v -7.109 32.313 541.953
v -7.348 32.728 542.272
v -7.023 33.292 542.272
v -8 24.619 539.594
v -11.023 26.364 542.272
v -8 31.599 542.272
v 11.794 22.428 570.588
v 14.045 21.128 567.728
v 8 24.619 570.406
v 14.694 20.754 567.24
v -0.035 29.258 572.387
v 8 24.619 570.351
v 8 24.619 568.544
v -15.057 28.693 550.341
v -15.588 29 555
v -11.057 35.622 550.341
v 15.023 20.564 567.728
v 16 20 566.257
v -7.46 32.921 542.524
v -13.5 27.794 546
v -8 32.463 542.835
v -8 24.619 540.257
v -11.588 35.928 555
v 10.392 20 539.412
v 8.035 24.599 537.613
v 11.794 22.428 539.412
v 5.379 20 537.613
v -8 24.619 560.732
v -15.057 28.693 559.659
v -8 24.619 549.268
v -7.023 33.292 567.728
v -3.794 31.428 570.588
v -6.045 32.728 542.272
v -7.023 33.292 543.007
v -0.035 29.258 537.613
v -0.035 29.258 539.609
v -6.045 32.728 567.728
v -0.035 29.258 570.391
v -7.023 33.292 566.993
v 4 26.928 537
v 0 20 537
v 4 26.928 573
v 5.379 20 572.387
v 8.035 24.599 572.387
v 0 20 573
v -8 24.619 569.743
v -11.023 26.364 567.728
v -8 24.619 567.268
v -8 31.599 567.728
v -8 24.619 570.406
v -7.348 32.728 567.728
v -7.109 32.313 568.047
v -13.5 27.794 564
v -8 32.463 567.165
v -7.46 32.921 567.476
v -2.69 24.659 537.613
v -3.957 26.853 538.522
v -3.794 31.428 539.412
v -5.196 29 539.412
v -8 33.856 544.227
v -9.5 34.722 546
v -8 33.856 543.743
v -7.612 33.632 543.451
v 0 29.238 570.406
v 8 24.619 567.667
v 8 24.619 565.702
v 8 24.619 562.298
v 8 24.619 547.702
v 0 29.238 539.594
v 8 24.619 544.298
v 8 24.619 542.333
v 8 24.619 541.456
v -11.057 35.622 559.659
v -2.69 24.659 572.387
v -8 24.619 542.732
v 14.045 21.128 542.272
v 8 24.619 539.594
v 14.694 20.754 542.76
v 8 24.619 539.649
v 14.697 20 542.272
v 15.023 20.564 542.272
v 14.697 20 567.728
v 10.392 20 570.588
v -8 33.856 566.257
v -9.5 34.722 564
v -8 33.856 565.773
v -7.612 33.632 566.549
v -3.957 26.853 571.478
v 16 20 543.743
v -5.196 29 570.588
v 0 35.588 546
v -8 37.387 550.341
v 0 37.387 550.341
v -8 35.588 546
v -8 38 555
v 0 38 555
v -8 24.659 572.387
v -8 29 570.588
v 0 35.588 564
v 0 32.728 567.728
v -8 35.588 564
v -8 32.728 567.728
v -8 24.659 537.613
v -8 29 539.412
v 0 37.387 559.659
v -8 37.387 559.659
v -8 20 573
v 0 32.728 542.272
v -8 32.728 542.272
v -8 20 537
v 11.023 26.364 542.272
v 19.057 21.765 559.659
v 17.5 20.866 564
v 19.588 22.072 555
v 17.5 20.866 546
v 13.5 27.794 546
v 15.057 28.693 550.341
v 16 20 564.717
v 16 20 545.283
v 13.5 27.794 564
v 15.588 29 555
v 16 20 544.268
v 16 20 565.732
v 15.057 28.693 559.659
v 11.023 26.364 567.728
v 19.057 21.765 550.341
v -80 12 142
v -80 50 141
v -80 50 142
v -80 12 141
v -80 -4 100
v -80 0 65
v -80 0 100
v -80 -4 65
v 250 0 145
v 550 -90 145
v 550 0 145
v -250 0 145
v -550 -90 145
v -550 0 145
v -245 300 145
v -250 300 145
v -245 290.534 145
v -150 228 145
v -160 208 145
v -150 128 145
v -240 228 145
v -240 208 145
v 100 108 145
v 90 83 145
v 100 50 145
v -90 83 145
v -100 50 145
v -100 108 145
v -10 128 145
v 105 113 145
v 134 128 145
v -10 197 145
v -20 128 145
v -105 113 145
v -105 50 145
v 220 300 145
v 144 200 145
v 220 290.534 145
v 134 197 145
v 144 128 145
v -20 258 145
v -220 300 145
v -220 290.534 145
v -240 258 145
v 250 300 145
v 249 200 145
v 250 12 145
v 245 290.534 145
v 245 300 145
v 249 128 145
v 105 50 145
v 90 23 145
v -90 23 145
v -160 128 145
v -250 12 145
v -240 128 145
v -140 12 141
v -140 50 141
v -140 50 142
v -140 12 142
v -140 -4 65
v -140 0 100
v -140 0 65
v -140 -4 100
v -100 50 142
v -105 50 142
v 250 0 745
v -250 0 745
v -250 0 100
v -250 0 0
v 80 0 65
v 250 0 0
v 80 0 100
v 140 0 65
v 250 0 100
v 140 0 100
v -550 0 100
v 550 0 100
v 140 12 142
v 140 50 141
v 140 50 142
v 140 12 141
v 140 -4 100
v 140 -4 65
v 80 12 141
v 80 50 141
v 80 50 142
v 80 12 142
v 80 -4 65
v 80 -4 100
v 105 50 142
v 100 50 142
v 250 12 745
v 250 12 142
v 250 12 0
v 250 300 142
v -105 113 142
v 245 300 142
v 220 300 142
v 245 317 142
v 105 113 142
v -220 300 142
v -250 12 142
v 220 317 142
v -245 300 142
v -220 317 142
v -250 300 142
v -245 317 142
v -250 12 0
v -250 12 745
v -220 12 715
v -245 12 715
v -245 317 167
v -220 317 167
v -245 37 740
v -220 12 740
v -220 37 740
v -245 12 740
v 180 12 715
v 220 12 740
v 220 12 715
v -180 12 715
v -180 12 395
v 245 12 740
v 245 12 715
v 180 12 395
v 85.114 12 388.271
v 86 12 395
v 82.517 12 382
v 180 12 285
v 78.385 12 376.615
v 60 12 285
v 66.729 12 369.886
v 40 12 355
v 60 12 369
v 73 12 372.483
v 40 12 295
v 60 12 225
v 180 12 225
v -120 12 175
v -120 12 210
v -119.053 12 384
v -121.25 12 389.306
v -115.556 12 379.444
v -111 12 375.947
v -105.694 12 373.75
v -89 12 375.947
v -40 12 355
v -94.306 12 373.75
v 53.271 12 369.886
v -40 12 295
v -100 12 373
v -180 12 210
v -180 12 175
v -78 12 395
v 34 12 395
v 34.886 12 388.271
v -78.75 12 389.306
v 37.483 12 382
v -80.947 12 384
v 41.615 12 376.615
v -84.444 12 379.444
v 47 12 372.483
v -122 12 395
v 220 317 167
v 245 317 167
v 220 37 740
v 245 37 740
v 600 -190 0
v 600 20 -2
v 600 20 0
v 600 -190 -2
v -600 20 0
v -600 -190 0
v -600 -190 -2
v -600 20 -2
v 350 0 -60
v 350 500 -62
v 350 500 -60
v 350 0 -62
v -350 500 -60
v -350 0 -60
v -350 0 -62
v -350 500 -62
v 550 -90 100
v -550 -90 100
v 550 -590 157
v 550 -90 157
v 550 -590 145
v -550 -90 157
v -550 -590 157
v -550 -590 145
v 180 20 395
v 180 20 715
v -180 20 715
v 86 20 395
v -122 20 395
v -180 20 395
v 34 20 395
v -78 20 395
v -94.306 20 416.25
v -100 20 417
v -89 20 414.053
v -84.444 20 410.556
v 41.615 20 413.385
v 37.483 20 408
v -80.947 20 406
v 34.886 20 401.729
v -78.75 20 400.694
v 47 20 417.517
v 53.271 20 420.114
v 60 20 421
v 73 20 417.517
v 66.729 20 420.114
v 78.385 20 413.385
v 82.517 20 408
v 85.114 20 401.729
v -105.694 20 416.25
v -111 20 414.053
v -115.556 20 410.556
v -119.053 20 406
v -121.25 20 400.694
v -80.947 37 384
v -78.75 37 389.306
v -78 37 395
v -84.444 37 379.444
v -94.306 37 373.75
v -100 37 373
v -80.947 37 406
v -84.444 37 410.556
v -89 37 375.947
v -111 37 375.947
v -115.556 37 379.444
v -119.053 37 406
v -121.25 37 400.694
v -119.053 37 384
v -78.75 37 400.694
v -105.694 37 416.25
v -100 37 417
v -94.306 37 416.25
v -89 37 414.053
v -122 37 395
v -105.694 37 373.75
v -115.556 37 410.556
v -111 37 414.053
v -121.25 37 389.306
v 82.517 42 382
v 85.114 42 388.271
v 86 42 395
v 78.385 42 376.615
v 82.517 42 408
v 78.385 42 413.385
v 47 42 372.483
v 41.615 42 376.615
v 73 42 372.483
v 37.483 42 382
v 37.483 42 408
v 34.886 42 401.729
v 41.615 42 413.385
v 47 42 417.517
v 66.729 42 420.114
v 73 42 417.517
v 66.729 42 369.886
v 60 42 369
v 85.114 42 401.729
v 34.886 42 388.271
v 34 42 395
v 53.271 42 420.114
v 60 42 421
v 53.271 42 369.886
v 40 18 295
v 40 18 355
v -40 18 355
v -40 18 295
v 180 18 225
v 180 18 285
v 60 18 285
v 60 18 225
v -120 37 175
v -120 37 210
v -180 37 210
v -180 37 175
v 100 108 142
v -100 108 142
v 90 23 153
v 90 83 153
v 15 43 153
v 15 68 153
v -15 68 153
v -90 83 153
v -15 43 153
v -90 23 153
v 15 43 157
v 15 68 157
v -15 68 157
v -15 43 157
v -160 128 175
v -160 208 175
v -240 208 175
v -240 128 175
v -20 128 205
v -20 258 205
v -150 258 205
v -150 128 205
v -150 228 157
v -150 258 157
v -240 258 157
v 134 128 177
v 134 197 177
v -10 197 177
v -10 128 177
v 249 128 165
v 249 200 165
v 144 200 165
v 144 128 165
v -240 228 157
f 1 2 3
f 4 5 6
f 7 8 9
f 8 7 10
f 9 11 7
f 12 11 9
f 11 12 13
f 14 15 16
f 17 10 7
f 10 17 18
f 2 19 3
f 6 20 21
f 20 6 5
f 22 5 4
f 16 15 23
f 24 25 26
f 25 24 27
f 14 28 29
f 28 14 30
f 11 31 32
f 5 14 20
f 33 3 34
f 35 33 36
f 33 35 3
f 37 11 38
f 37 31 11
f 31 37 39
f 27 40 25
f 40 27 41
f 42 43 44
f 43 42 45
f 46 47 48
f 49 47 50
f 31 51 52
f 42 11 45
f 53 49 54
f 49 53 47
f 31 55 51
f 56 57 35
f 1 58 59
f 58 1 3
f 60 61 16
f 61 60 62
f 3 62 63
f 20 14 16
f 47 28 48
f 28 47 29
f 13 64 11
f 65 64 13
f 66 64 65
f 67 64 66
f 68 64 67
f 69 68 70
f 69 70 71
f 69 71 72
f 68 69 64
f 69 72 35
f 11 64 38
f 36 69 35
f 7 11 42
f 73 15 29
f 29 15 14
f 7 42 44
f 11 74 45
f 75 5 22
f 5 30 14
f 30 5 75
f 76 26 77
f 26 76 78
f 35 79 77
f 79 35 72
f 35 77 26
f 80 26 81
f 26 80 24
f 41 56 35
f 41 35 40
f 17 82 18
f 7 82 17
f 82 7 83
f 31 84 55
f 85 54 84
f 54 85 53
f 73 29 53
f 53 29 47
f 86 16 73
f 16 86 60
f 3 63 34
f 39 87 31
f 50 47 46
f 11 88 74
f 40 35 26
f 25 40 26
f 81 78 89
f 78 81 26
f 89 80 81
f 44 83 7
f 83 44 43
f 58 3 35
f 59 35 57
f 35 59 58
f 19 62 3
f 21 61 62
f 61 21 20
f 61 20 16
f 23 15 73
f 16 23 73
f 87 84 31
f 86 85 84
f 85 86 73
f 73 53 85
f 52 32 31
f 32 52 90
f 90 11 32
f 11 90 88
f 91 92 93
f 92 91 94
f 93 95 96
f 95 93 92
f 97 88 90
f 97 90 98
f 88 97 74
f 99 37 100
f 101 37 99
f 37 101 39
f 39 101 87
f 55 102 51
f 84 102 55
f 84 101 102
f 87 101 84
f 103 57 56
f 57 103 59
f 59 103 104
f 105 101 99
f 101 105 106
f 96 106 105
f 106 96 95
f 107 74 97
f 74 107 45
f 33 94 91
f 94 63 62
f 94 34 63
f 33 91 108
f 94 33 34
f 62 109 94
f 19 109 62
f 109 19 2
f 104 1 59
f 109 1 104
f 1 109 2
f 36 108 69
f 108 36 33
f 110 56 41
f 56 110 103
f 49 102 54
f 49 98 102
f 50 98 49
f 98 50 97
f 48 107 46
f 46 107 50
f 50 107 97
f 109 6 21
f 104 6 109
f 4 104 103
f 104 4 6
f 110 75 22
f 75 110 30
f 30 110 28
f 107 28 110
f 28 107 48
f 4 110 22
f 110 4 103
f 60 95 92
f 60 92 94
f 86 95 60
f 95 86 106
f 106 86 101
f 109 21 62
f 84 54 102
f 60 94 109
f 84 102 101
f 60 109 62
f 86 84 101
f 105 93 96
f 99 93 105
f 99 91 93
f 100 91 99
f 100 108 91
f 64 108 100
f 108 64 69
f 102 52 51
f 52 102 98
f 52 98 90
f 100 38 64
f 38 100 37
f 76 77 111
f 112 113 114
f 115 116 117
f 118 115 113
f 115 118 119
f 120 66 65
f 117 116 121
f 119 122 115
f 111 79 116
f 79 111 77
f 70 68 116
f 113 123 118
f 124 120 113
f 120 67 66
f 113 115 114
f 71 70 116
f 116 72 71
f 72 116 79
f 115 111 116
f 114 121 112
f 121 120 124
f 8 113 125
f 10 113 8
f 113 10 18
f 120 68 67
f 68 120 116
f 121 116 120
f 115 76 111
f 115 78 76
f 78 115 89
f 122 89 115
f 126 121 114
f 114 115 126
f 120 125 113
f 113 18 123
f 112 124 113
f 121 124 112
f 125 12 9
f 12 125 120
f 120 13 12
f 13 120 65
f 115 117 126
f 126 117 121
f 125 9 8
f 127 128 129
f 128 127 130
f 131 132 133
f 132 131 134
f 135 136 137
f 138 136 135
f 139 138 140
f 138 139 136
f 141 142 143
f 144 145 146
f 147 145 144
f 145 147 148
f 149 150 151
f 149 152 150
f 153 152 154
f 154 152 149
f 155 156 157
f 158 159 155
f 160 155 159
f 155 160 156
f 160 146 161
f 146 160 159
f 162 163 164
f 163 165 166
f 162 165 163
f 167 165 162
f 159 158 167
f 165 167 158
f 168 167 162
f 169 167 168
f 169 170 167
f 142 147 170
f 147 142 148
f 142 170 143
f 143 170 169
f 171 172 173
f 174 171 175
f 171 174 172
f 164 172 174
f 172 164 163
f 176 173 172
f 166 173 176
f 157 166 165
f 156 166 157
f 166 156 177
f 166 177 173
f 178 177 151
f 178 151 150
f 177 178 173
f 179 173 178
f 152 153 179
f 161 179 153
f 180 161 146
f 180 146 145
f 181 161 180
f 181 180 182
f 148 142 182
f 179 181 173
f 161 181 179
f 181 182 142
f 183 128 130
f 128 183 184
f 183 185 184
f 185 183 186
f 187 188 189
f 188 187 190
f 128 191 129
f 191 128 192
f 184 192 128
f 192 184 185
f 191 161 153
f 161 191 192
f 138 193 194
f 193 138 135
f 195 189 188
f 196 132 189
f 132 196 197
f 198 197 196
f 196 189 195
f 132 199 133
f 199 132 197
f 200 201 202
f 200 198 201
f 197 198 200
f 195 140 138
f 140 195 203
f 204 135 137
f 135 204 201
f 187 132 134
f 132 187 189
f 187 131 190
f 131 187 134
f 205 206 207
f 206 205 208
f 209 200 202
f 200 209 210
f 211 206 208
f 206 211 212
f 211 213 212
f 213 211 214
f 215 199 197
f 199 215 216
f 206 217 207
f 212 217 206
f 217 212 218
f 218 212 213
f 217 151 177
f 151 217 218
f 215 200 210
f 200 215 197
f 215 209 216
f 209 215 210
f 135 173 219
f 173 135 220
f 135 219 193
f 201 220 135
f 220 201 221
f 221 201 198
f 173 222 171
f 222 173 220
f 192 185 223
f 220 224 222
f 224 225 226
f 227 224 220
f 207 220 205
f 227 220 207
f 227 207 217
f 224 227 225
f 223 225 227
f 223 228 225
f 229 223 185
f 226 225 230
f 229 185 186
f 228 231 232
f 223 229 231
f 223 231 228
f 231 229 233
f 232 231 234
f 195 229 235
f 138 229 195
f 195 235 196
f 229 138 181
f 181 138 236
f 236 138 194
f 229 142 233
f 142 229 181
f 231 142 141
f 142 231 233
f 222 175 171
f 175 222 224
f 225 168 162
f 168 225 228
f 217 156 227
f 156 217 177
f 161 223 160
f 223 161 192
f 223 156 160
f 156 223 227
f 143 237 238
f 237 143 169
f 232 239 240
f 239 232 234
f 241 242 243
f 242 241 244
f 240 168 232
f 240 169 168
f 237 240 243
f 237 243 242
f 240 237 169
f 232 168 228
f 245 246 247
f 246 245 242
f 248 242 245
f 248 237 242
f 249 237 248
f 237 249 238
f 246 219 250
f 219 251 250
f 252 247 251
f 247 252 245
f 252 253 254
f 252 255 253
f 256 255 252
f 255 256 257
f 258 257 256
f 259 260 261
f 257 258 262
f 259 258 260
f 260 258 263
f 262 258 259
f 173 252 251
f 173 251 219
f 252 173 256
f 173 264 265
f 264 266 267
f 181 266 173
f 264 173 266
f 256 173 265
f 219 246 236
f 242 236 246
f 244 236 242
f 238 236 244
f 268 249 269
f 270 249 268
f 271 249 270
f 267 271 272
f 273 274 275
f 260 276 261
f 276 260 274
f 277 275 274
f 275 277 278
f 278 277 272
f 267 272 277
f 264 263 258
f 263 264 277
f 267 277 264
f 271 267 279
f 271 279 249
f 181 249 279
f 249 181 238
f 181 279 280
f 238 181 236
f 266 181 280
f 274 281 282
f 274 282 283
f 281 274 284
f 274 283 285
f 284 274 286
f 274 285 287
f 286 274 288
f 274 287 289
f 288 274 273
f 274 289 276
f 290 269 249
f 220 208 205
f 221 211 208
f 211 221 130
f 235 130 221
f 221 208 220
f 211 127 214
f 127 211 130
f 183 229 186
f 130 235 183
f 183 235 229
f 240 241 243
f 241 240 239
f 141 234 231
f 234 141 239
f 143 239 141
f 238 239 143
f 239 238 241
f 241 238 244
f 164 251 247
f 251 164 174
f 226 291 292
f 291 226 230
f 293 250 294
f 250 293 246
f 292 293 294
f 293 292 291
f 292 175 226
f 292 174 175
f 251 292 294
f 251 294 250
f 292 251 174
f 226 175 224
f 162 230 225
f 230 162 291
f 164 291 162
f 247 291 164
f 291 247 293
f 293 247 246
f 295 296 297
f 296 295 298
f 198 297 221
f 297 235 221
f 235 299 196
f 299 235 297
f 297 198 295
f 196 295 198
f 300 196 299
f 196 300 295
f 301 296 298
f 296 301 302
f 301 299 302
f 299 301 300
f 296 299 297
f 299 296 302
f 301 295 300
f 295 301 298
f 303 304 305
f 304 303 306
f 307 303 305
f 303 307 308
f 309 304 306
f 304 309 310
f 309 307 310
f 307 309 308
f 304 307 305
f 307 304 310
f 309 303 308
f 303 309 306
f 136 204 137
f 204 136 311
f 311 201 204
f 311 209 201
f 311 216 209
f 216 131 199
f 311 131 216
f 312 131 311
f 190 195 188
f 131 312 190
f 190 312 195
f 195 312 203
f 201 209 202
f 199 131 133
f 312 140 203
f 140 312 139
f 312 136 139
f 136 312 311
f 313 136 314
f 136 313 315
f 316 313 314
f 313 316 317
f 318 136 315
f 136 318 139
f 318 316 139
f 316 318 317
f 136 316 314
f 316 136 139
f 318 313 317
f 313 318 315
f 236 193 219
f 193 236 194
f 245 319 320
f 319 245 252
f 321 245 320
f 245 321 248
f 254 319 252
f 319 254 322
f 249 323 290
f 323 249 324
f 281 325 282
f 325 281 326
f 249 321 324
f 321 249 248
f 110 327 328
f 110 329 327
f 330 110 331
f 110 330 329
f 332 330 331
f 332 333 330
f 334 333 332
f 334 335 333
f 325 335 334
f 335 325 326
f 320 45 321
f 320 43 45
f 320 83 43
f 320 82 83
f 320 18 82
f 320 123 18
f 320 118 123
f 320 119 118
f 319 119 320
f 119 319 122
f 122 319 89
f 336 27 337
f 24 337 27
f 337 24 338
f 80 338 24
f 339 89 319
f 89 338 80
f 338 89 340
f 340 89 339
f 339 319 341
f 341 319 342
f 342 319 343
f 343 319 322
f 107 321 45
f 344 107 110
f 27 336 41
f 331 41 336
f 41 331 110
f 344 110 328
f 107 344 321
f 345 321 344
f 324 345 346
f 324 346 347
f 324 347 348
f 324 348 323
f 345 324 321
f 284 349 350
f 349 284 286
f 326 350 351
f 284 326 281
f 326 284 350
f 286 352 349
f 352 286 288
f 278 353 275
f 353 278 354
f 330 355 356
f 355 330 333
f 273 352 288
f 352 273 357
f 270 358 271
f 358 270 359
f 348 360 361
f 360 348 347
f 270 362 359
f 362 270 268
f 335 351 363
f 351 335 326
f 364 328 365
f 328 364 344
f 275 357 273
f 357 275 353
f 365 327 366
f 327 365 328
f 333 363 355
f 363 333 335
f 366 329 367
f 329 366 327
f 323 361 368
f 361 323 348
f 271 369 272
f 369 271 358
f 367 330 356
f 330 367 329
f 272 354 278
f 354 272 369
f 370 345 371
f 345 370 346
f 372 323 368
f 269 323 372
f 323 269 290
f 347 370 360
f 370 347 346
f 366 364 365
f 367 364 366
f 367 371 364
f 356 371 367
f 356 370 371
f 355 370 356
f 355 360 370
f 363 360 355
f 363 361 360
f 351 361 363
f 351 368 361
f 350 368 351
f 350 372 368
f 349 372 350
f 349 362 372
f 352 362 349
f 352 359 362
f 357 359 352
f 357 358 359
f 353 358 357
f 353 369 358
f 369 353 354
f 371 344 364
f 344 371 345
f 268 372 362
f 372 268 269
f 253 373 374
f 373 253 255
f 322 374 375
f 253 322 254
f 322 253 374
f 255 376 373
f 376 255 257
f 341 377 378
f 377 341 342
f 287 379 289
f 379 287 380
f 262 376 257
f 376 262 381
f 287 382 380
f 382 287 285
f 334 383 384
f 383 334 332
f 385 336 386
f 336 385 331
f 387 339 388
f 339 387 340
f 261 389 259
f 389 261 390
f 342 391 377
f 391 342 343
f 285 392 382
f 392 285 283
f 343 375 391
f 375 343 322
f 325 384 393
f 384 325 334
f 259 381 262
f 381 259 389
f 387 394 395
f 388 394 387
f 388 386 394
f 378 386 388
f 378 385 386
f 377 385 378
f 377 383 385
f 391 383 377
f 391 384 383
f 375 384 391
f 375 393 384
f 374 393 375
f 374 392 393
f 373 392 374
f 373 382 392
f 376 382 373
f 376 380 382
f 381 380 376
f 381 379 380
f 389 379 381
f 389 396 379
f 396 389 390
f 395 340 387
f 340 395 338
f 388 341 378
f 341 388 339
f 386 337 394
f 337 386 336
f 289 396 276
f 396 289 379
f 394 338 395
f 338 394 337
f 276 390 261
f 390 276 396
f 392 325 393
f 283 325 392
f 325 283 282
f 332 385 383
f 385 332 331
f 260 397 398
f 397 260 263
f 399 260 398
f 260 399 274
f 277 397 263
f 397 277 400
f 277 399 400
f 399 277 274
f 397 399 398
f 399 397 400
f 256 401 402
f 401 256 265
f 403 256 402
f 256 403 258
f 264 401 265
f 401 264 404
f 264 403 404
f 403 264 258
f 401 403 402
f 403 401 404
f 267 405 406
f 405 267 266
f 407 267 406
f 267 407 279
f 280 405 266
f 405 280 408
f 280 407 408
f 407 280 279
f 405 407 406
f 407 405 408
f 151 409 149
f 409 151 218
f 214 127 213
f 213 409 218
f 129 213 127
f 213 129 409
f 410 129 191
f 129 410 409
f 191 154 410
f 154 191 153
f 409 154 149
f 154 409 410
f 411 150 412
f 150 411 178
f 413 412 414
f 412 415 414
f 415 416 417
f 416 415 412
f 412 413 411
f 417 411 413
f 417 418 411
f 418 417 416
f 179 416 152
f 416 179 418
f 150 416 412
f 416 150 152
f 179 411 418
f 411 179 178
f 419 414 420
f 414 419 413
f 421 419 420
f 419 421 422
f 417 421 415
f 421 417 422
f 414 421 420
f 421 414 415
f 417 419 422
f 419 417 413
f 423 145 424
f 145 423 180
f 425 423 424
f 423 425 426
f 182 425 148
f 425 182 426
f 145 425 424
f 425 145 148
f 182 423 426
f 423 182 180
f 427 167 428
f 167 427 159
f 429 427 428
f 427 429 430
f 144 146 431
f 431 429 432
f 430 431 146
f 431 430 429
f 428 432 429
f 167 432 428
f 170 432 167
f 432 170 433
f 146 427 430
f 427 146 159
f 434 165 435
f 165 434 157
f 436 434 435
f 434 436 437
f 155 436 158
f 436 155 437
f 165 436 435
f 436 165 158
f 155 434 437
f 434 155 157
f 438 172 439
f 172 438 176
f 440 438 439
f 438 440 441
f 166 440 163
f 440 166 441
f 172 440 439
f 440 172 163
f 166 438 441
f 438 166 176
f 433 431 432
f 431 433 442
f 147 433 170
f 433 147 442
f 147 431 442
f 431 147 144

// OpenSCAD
// Compute tray layout sketch — hybrid L-shape design
//
// =============================================================================
// DESIGN SUMMARY
// =============================================================================
//
// Existing 2x4 cross-member (bolted to rear seat anchor points) is kept.
// Existing vertical plywood panel (between front seats, carries flux capacitor
// + power-gear panel-mount kit on cabin face) is kept.
//
// New build adds:
//   - Wood horizontal shelf (12mm plywood) bolted to front face of vertical
//     panel, sitting at top-of-2x4 height. Has a rectangular cutout where the
//     metal sensor sub-tray drops in.
//   - Two metal L-brackets (50x50x4 aluminium angle) bolted to the front face
//     of the 2x4. Vertical flange clamps to 2x4, horizontal flange extends
//     forward and carries the sensor sub-tray. Doubles as L-junction stiffener
//     for the shelf-wall corner.
//   - Metal sensor sub-tray (3mm aluminium plate) bolted to L-bracket horizontal
//     flanges. Carries the sensor PCB with IMU. CHASSIS-COUPLED via 2x4, no wood
//     in the rigid path so the IMU sees clean chassis dynamics.
//   - Two diagonal braces (25x25 aluminium angle) from top of vertical wall
//     down to front edge of shelf, hugging the lateral edges. Triangulates the
//     L-section so neither plate is a free cantilever.
//
// Removable mounting (planned, not drawn): studs + locating dowels protruding
// from top of 2x4, brackets on the wood shelf drop over them, nuts clamp.
// 2 dowels for alignment + 3-4 studs for clamping. Whole assembly lifts off
// in under a minute for service.
//
// Mounting tilt compensation (planned, not drawn): a wedge shim between the
// L-bracket vertical flange and the 2x4 face, cut to whatever angle the 2x4
// front face is off vertical. Measured at install time, not pre-fabricated.
//
// =============================================================================
// INVENTORY (full list of what mounts on the assembly)
// =============================================================================
//
// On the vertical wall, cabin face:
//   - Flux capacitor (decorative, ~360x320, top of wall)
//   - Kill switch (50mm dia knob, mid-upper)
//   - Smart VSR / battery isolator (Powertech 140A, ~70mm dia can, mid-upper)
//   - Plutonium / digital readout (~80x60, mid)
//   - Fuse block (~120x60, lower)
//   - Anderson plug (~50x50x50, bottom)
//
// On the wood shelf, in a single row across the width (network-ordered):
//   - UGREEN 12V→USB-C PD adapter (80x80x30, passenger end)
//     12V input from fuse block, USB-C PD outputs to Pi + screen + router
//   - Pi castle (130x130x60)
//     USB-C PD power, ethernet to BE3600, USB to RTL-SDR, qwiic to sensor PCB,
//     GPIO to button, USB to cameras, HDMI to co-driver screen, SMA to GPS
//   - GL.iNet GL-BE3600 (Slate 7, 144x69x32)
//     USB-C PD power, ethernet to Pi + M1, SMA WiFi antennae external
//   - Netgear Nighthawk M1 (MR1100, 105x72x20, LCD up)
//     USB-C power, ethernet to BE3600, TS-9 LTE antennae external
//
// Zip-tied to baseplate via short USB extension:
//   - RTL-SDR (TPMS reception)
//
// On the metal sensor sub-tray (chassis-coupled):
//   - Sensor PCB carrying IMU (LSM6DSOX+LIS3MDL), magnetometer, BME680,
//     VEML7700, INA226. Qwiic chain back to Pi.
//
// Off the assembly (mentioned for context):
//   - LiFePO4 batteries in passenger footwells (12V power feed runs back to
//     wall-mounted kill switch)
//   - Co-driver screen on passenger dashboard (HDMI from Pi)
//   - Front + cabin cameras (USB to Pi)
//   - GPS antenna roof-mounted (SMA to Pi)
//   - All network antennae (TS-9 + SMA) external, routed up to roof
//   - Engine bay 1-wire DS18B20 probes (GX12 to Pi)
//   - Capture button under the handbrake (GX12 to Pi)
//
// =============================================================================
// COLOUR LEGEND (what each colour represents in the rendered output)
// =============================================================================
//
// STRUCTURE:
//   tan/burlywood          existing 2x4 cross-member
//   light tan              existing vertical plywood wall
//   medium brown           new wood horizontal shelf
//   orange                 new metal L-brackets (chassis-coupled)
//   bright orange          new diagonal braces
//   silver/grey            new metal sensor sub-tray
//   faint cream            existing boot cover (drawn faintly for context)
//   dark grey, transparent floor pan reference
//
// PANEL-MOUNT KIT (on vertical wall, cabin face):
//   black rectangle        flux capacitor backing plate
//   off-white cylinders    flux capacitor Y-arm tubes
//   red knob               kill switch
//   dark grey can          VSR / smart isolator
//   yellow square          plutonium / digital readout
//   dark grey rectangle    fuse block
//   medium grey block      Anderson plug
//
// SHELF DEVICES:
//   yellow block           UGREEN 12V→USB-C PD adapter
//   dark blue              Pi castle
//   medium blue            GL.iNet GL-BE3600 (Slate 7)
//   near-black             Netgear Nighthawk M1 (LCD up)
//   dark red               RTL-SDR (zip-tied)
//
// SENSOR:
//   mid-green              sensor PCB (IMU + mag + BME680 + VEML7700 + INA226)
//   darker green           IMU chip itself (the part that needs rigid mount)
//
// =============================================================================
// COORDINATE SYSTEM
// =============================================================================
//   +X = passenger side (lateral)
//   +Y = forward (toward front of car)
//   +Z = up
//   Origin: floor pan, on the centreline of the 2x4 rear face
//
// All dimensions are rough estimates. Replace with measured values before fab.

$fn = 24;

// === measured-then-update dimensions ===
beam_x        = 1100;   // 2x4 length across the car
beam_y        = 90;     // 2x4 dressed thickness front-to-back
beam_z        = 45;     // 2x4 dressed height
beam_z_off    = 100;    // 2x4 sits this high above the rear floor pan

// Vertical panel (existing, kept)
wall_x        = 500;    // wall width across the car (between the front seats)
wall_t        = 12;     // 12 mm plywood (or could be 3 mm aluminium)
wall_z        = 600;    // wall height above the 2x4 top
                        // (flux capacitor up high, switch/isolator/Anderson lower)

// Horizontal shelf (new, bolted to front face of vertical panel)
shelf_x       = 500;    // shelf width (matches wall width)
shelf_y       = 300;    // shelf depth forward of wall front face
shelf_t       = 3;      // aluminium plate thickness
shelf_z       = beam_z_off + beam_z;  // shelf top surface level with 2x4 top

// IMU bracket pass-through in the shelf
imu_hole_x    = 80;
imu_hole_y    = 60;
imu_y         = 150;    // forward of wall front face

// Components (rough placements, real sizes)
pi_x = 130; pi_y = 130; pi_z = 60;          // Pi castle (printed case, est.)
m1_x = 105; m1_y = 72;  m1_z = 20;          // Netgear Nighthawk M1
be_x = 144; be_y = 69;  be_z = 32;          // GL.iNet GL-BE3600
ug_x = 80;  ug_y = 80;  ug_z = 30;          // UGREEN 12V→USB-C PD adapter
fuse_x = 120; fuse_y = 60; fuse_z = 30;     // Fuse block

// === floor pan reference (low transparent slab) ===
front_pan_drop = 60;
color([0.25, 0.25, 0.30, 0.4])
  translate([-beam_x/2 - 50, -beam_y - 100, -2])
    cube([beam_x + 100, beam_y + 100 + 20, 2]);

color([0.25, 0.25, 0.30, 0.4])
  translate([-shelf_x/2 - 100, 0, -front_pan_drop - 2])
    cube([shelf_x + 200, shelf_y + 200, 2]);

// === 2x4 cross-member (existing) ===
color("burlywood")
  translate([-beam_x/2, -beam_y, beam_z_off])
    cube([beam_x, beam_y, beam_z]);

// === boot cover (existing, hinged on TOP of 2x4) — drawn faintly ===
color([0.70, 0.55, 0.35, 0.10])
  translate([-beam_x/2, -beam_y - 500, beam_z_off + beam_z])
    cube([beam_x, 500, 12]);

// === vertical panel (existing) ===
// Bolts to front face of 2x4, rises from floor pan to wall top
color([0.85, 0.65, 0.40, 0.85])
  translate([-wall_x/2, 0, 0])
    cube([wall_x, wall_t, beam_z_off + beam_z + wall_z]);

// === flux capacitor (the important bit) on cabin face of wall ===
// Mounted high, facing forward (toward cabin)
color([0.10, 0.10, 0.12])
  translate([-180, wall_t, beam_z_off + beam_z + 250])
    cube([360, 8, 320]);
// three Y-shaped tubes, simplified as cylinders, sticking forward
for (a = [-30, 90, 210])
  color([0.85, 0.85, 0.90])
    translate([0, wall_t + 8, beam_z_off + beam_z + 410])
      rotate([0, 0, a])
        rotate([-90, 0, 0])
          cylinder(h = 8, r = 18);

// === panel-mount controls on cabin face of wall ===
// All Z values relative to top of 2x4 (= shelf surface = shelf_z).

// Kill switch (red knob), z+250, slightly off-centre passenger side
color([0.85, 0.15, 0.15])
  translate([-100, wall_t, shelf_z + 250])
    rotate([-90, 0, 0])
      cylinder(h = 25, r = 22);

// VSR / isolator (round can), z+250, driver side
color([0.20, 0.20, 0.22])
  translate([60, wall_t, shelf_z + 250])
    rotate([-90, 0, 0])
      cylinder(h = 30, r = 26);

// Plutonium / digital readout, z+150
color([0.95, 0.85, 0.20])
  translate([-40, wall_t, shelf_z + 150])
    cube([80, 6, 60]);

// Fuse block, z+80, driver side
color([0.30, 0.30, 0.30])
  translate([60, wall_t, shelf_z + 80])
    cube([fuse_x, 6, fuse_y]);

// Anderson plug, z+30, just above shelf surface, passenger side
color([0.40, 0.40, 0.45])
  translate([-180, wall_t, shelf_z + 30])
    cube([60, 25, 35]);

// === metal L-brackets (new) — primary structural element ===
// Aluminium angle, vertical flange bolted to 2x4 front face, horizontal flange
// extends forward to carry the sensor sub-tray. Doubles as L-junction stiffener
// for the shelf-wall corner.
lbk_h         = 50;     // horizontal flange depth
lbk_v         = 80;     // vertical flange height (tall enough to reach 2x4 face)
lbk_t         = 4;      // angle thickness
lbk_x         = 60;     // bracket width across car
lbk_inset     = 80;     // distance from centreline to inner edge of bracket
lbk_top_z     = shelf_z;  // horizontal flange top surface = shelf top level
color([0.85, 0.55, 0.20])
  for (sx = [-lbk_inset - lbk_x, lbk_inset]) {
    // horizontal flange (extends forward from 2x4 face)
    translate([sx, 0, lbk_top_z - lbk_t])
      cube([lbk_x, lbk_h, lbk_t]);
    // vertical flange (bolts to 2x4 front face, drops down into the 2x4)
    translate([sx, -lbk_t, lbk_top_z - lbk_v])
      cube([lbk_x, lbk_t, lbk_v]);
  }

// === horizontal shelf (wood) — non-load-bearing surface for kit ===
// Sits at top-of-2x4 height. Has a cutout in the centre where the sensor sub-tray lives.
sub_tray_x   = 200;   // sensor sub-tray width
sub_tray_y   = 100;   // sensor sub-tray depth
sub_tray_t   = 3;     // sensor sub-tray thickness (aluminium)
sub_tray_y0  = 8;     // sensor sub-tray rear edge offset from 2x4 face
color([0.78, 0.62, 0.35, 0.85])
  difference() {
    translate([-shelf_x/2, 0, shelf_z - shelf_t])
      cube([shelf_x, shelf_y, shelf_t]);
    // cutout for sensor sub-tray
    translate([-sub_tray_x/2 - 5, sub_tray_y0 - 5, shelf_z - shelf_t - 1])
      cube([sub_tray_x + 10, sub_tray_y + 10, shelf_t + 2]);
  }

// === sensor sub-tray (aluminium, mounted on metal L-brackets) ===
// Carries the sensor cluster including the IMU. Chassis-coupled via L-brackets → 2x4.
color([0.75, 0.75, 0.78])
  translate([-sub_tray_x/2, sub_tray_y0, shelf_z - sub_tray_t])
    cube([sub_tray_x, sub_tray_y, sub_tray_t]);

// === diagonal braces (new) — top of wall to front edge of shelf ===
// One brace each side, hugging the lateral edges, leaving the shelf middle clear.
// Triangulates the L-section so the wall stops being a free cantilever and the
// shelf stops being a free cantilever — they brace each other.
brace_top_z    = beam_z_off + beam_z + wall_z - 30;   // anchor near top of wall
brace_top_y    = wall_t;                              // on wall front face
brace_bot_z    = shelf_z - shelf_t;                   // anchor at shelf underside
brace_bot_y    = wall_t + shelf_y - 20;               // near front edge of shelf
brace_section  = 25;                                   // rough section size for sketch
color([0.95, 0.55, 0.15])
  for (sx = [-shelf_x/2 + 5, shelf_x/2 - 5 - brace_section]) {
    hull() {
      // top anchor block
      translate([sx, brace_top_y, brace_top_z])
        cube([brace_section, brace_section, brace_section]);
      // bottom anchor block
      translate([sx, brace_bot_y, brace_bot_z])
        cube([brace_section, brace_section, brace_section]);
    }
  }

// === sensor cluster (on the metal sub-tray) ===
// Sensor PCB carries IMU, magnetometer, light, BME680, INA226. Sat on sub-tray.
color([0.20, 0.55, 0.30])
  translate([-90, sub_tray_y0 + 15, shelf_z])
    cube([180, 60, 8]);
// IMU chip (the bit that actually cares about rigid mounting)
color("darkgreen")
  translate([-15, sub_tray_y0 + 35, shelf_z + 8])
    cube([30, 25, 4]);

// === components on the wood shelf ===
// Single-row layout across the width, ordered for short cable runs:
//
//   Y=300 (front edge of shelf, cabin side)
//   +--------------------------------------------+
//   |  [UG]  [Pi]    [BE3600]    [M1]            |
//   |  80    130     144         105             |
//   |  USB-C USB-C   eth+USB-C   eth+USB-C       |
//   |   ──── power ────►                         |
//   |        ◄─── eth ──►◄─── eth ──►            |
//   |                                            |
//   |   [RTL-SDR]                                |
//   |                                            |
//   |          [sensor sub-tray cutout]          |
//   +--------------------------------------------+
//   Y=0 (rear, against wall)
//   X=-250 (passenger)               X=+250 (driver)

// UGREEN 12V→USB-C PD adapter — passenger end of row
color([0.85, 0.85, 0.30, 0.85])
  translate([-240, sub_tray_y0 + sub_tray_y + 20, shelf_z])
    cube([ug_x, ug_y, ug_z]);

// Pi castle — next to UGREEN
color([0.20, 0.30, 0.75, 0.85])
  translate([-150, sub_tray_y0 + sub_tray_y + 20, shelf_z])
    cube([pi_x, pi_y, pi_z]);

// GL.iNet GL-BE3600 — middle (between Pi and M1 for ethernet flow)
color([0.30, 0.50, 0.70, 0.90])
  translate([-10, sub_tray_y0 + sub_tray_y + 20, shelf_z])
    cube([be_x, be_y, be_z]);

// Netgear Nighthawk M1 — driver end of row (LCD up)
color([0.10, 0.10, 0.10, 0.90])
  translate([144, sub_tray_y0 + sub_tray_y + 20, shelf_z])
    cube([m1_x, m1_y, m1_z]);

// RTL-SDR (zip-tied to baseplate via short USB extension)
color([0.55, 0.10, 0.10, 0.90])
  translate([-240, sub_tray_y0 + sub_tray_y + ug_y + 40, shelf_z])
    cube([90, 30, 12]);
